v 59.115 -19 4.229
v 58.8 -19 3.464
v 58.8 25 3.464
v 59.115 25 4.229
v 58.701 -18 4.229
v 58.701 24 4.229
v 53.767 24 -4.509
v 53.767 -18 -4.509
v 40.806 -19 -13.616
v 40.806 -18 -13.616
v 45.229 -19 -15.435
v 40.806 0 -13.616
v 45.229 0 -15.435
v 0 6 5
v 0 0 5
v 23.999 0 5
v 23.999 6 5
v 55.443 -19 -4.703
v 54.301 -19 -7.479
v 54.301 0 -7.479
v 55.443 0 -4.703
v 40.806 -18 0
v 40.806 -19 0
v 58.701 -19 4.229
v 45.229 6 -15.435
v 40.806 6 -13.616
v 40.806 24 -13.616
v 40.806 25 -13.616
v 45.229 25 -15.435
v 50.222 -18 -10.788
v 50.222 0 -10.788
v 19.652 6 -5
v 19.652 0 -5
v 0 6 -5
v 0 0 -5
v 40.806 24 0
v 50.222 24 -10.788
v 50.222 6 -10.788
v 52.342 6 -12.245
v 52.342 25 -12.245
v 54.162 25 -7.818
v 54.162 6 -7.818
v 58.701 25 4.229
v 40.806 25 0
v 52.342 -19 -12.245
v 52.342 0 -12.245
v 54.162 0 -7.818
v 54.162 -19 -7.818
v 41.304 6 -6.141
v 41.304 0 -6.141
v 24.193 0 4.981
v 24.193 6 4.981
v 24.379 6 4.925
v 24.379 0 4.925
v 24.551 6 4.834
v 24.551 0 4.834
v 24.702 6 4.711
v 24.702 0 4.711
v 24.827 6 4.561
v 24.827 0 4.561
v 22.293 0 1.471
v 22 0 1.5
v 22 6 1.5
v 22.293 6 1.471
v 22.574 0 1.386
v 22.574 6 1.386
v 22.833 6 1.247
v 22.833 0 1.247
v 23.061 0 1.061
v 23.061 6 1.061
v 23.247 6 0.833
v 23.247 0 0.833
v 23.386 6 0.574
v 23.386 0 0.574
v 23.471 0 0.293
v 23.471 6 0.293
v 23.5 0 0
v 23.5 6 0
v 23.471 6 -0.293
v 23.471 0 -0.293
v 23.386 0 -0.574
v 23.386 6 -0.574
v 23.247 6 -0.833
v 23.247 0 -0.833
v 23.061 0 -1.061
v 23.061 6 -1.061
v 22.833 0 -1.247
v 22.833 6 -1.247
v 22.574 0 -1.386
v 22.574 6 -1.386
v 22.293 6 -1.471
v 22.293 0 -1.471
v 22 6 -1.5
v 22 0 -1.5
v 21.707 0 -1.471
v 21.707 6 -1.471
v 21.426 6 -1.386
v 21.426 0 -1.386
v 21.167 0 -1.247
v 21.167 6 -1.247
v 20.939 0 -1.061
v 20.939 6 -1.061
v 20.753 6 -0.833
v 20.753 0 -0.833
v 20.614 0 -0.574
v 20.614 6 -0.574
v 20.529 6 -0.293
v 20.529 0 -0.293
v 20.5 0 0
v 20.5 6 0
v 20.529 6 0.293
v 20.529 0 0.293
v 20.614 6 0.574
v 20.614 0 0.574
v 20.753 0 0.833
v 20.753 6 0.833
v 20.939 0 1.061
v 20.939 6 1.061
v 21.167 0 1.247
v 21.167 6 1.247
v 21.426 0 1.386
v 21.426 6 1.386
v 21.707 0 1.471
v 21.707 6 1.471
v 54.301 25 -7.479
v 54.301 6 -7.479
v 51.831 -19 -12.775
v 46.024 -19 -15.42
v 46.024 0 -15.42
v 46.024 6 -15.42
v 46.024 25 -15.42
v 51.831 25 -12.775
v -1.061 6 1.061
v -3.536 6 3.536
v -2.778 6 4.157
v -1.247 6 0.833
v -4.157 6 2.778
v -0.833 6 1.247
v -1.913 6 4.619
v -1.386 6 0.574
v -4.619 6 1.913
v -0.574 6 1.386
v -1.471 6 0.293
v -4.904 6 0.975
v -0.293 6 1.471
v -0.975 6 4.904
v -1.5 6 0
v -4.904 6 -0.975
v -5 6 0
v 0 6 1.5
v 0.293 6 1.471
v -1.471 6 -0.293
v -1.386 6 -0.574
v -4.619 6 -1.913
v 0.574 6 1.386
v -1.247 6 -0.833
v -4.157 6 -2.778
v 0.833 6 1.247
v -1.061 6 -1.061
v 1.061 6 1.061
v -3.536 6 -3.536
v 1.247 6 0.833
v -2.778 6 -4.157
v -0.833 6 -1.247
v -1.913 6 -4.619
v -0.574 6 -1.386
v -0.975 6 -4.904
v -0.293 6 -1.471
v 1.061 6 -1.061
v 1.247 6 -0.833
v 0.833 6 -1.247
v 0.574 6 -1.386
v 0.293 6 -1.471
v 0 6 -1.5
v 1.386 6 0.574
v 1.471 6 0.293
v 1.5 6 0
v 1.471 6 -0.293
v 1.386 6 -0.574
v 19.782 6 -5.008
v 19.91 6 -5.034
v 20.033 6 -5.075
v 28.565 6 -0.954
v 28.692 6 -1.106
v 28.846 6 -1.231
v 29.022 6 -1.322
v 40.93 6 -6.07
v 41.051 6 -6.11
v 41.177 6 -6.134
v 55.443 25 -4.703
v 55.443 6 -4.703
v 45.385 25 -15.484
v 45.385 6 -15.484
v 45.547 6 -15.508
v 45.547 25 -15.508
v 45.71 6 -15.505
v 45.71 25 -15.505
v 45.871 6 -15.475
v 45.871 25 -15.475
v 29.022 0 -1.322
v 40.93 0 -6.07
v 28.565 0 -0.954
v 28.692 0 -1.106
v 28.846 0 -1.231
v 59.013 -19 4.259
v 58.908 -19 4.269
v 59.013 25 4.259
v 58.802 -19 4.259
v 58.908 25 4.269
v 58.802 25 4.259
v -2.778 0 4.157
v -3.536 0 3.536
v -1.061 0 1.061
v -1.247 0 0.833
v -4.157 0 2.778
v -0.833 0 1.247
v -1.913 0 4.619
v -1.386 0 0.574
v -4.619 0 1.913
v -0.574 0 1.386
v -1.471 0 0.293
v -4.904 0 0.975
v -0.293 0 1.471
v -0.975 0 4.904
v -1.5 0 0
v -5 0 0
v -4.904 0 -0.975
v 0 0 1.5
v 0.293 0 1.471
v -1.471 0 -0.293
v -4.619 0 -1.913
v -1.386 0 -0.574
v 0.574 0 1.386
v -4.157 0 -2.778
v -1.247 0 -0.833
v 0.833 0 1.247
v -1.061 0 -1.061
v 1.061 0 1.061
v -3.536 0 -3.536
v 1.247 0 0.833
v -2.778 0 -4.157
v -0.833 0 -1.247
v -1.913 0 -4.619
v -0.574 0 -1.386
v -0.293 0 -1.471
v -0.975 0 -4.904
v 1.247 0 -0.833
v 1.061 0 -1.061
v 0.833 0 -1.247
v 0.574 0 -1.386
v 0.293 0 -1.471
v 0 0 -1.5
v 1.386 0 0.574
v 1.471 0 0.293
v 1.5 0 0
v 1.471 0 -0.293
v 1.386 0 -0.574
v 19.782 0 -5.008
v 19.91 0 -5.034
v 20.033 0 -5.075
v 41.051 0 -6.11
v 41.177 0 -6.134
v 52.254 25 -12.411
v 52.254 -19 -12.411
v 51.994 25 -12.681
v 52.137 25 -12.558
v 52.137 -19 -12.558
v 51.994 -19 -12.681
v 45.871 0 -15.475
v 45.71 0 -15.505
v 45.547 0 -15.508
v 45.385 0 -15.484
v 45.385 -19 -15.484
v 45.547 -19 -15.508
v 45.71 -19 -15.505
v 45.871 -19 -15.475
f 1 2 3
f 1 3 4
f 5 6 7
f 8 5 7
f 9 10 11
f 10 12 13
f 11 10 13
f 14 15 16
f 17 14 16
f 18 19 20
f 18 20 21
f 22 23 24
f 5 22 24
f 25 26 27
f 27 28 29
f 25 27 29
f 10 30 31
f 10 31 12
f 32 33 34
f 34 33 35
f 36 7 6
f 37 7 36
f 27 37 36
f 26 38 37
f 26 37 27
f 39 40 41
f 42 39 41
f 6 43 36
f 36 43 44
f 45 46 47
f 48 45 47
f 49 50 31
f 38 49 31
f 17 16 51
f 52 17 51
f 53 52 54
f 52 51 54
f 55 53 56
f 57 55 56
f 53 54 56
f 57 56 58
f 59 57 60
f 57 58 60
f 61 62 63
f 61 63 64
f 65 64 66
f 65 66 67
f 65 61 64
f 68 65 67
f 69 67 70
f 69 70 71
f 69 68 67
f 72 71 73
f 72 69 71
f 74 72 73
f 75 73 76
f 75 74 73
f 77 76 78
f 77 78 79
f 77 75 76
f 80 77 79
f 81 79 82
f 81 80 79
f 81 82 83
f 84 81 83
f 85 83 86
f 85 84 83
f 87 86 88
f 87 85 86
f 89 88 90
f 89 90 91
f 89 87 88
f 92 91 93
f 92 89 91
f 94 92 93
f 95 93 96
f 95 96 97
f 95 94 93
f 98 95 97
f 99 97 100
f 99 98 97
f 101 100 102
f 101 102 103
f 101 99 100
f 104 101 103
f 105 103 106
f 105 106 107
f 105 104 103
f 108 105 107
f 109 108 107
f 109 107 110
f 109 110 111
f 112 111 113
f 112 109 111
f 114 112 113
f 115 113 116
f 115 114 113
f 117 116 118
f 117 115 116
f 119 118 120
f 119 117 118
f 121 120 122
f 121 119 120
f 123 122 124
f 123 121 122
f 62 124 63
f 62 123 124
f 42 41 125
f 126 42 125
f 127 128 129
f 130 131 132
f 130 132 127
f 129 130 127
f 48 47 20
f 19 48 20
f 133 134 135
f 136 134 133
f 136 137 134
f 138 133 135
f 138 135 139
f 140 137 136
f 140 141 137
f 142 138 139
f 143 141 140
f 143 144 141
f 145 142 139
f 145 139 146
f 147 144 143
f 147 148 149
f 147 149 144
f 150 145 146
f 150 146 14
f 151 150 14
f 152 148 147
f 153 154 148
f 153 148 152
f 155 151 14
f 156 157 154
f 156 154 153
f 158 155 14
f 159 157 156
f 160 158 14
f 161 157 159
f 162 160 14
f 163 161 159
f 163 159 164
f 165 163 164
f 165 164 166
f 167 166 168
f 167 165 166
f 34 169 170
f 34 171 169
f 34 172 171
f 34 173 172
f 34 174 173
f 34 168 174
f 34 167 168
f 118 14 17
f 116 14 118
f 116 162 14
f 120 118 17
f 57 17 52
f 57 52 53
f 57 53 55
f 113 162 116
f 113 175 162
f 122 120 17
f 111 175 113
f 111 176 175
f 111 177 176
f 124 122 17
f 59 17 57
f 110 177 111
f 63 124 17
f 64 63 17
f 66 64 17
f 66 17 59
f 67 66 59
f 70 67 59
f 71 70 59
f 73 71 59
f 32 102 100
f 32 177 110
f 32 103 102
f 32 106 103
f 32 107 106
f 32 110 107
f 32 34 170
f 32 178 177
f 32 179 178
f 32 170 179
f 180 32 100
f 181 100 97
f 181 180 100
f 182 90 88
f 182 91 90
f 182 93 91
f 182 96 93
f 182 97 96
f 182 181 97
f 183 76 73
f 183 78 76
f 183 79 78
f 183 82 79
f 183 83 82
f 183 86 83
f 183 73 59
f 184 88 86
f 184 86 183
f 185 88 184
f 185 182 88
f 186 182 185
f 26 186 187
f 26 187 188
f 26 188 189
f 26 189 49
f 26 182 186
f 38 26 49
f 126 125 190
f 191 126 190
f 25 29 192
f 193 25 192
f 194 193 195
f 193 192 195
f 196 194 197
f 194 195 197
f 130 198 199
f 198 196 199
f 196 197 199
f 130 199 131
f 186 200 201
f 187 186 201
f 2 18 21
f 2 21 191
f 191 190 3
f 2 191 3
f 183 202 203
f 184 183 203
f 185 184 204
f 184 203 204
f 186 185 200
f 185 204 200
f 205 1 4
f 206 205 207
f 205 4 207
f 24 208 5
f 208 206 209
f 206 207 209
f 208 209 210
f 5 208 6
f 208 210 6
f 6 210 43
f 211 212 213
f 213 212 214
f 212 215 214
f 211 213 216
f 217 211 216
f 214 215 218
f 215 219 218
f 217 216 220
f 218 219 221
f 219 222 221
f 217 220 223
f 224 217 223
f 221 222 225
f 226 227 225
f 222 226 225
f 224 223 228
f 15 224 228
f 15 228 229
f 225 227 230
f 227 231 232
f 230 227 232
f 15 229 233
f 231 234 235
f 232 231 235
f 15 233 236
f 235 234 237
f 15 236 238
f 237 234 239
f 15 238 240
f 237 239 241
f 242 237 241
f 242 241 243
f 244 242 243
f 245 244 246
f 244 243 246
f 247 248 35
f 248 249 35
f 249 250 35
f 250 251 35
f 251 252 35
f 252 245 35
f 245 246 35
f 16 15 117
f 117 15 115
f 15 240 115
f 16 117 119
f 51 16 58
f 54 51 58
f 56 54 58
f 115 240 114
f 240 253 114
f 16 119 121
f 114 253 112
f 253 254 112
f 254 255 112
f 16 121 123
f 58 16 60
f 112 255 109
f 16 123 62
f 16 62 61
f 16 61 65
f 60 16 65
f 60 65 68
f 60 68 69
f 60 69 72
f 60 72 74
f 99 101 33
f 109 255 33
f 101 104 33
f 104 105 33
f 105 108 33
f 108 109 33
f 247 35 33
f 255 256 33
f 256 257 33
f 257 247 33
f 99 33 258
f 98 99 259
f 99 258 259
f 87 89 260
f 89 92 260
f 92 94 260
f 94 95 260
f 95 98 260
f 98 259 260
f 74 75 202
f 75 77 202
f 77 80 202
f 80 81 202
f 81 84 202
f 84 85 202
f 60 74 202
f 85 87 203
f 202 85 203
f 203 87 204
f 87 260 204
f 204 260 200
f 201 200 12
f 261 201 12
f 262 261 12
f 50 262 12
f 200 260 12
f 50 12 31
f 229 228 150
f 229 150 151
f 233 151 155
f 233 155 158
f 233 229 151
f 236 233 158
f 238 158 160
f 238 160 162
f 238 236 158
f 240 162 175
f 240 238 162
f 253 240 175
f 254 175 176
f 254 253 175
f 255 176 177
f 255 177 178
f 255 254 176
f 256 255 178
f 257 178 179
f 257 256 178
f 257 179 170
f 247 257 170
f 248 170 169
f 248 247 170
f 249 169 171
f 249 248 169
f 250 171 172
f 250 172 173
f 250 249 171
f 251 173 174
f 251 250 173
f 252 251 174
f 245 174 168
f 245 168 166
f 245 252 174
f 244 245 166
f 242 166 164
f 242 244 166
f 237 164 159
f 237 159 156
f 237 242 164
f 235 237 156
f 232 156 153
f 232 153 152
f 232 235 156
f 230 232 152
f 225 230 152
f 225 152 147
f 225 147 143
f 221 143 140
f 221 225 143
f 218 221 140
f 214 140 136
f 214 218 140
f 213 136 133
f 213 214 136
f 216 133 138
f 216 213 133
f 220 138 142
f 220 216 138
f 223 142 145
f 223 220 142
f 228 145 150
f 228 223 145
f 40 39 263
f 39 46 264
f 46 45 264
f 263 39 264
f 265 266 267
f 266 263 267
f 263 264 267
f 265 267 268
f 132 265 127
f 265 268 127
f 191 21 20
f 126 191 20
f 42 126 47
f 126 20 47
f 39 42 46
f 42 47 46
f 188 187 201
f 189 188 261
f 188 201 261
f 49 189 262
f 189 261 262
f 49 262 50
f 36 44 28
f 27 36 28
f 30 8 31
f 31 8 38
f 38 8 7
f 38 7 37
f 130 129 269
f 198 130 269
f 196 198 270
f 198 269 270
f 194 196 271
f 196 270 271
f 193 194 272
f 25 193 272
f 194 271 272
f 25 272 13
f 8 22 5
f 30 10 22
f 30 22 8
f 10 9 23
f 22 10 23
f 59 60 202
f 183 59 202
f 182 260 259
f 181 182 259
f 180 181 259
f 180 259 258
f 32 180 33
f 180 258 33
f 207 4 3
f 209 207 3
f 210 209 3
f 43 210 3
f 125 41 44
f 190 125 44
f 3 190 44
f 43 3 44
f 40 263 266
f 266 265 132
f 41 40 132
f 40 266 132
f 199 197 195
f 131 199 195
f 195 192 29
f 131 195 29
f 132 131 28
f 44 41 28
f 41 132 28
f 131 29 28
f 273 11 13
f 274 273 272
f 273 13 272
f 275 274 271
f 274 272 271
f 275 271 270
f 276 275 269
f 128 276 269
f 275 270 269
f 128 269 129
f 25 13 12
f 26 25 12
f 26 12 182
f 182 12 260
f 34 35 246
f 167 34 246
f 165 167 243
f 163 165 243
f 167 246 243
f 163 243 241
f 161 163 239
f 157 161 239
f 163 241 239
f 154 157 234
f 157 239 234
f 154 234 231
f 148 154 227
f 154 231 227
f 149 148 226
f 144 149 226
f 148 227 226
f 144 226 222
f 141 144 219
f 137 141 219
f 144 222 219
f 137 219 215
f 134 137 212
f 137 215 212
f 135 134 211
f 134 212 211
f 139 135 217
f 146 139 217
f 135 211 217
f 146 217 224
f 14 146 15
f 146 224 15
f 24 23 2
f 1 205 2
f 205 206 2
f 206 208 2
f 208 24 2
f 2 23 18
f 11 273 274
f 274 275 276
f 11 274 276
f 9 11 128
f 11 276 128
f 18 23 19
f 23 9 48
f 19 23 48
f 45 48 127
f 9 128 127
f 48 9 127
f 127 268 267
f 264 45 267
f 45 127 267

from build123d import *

# Parameters (mm, degrees)
SKETCH1_R                    = 1.5
BOSS_EXTRUDE1_DEPTH          = 6
SALIENTE_EXTRUIR7_DEPTH      = 19
SALIENTE_EXTRUIR7_DEPTH_BACK = 25
CORTAR_EXTRUIR2_DEPTH        = 25
SALIENTE_EXTRUIR8_DEPTH      = 1
SALIENTE_EXTRUIR10_DEPTH     = 1


with BuildPart() as part:
    # Sketch1 → Boss-Extrude1 (new body)
    with BuildSketch(Plane(origin=(0, 0, 0), x_dir=(1, 0, 0), z_dir=(0, 1, 0))):
        with BuildLine():
            Line((0, -5), (23.998875872, -5))
            ThreePointArc((23.998875872, -5), (24.467345461, -4.883479623), (24.826642543, -4.561072489))
            Line((24.826642543, -4.561072489), (28.564941326, 0.954149161))
            ThreePointArc((28.564941326, 0.954149161), (28.766036178, 1.172359953), (29.022312673, 1.321950886))
            Line((29.022312673, 1.321950886), (40.929553216, 6.070049343))
            ThreePointArc((40.929553216, 6.070049343), (41.304486381, 6.141164834), (41.678758689, 6.066649533))
            Line((41.678758689, 6.066649533), (47.144586244, 3.829406729))
            Line((47.144586244, 3.829406729), (48.06174016, 3.086958957))
            Line((48.06174016, 3.086958957), (48.804187932, 4.004112872))
            Line((48.804187932, 4.004112872), (49.721341848, 3.2616651))
            Line((49.721341848, 3.2616651), (50.46378962, 4.178819016))
            Line((50.46378962, 4.178819016), (51.380943536, 3.436371244))
            Line((51.380943536, 3.436371244), (52.123391308, 4.35352516))
            Line((52.123391308, 4.35352516), (53.040545224, 3.611077387))
            Line((53.040545224, 3.611077387), (53.782992996, 4.528231303))
            Line((53.782992996, 4.528231303), (54.700146912, 3.785783531))
            Line((54.700146912, 3.785783531), (55.442594685, 4.702937447))
            Line((55.442594685, 4.702937447), (52.341745918, 12.244834503))
            ThreePointArc((52.341745918, 12.244834503), (52.137055639, 12.558350103), (51.831402108, 12.774604725))
            Line((51.831402108, 12.774604725), (46.024183924, 15.419882568))
            ThreePointArc((46.024183924, 15.419882568), (45.628323444, 15.509674561), (45.229386093, 15.434727162))
            Line((45.229386093, 15.434727162), (20.032711481, 5.075121772))
            ThreePointArc((20.032711481, 5.075121772), (19.846254378, 5.018960187), (19.652448068, 5))
            Line((19.652448068, 5), (0, 5))
            ThreePointArc((0, 5), (-5, 0), (0, -5))
        make_face()
        with Locations(Location((0, 0, 0), (0, 0, 270))):
            Circle(SKETCH1_R, mode=Mode.SUBTRACT)
        with Locations(Location((22, 0, 0), (0, 0, 270))):
            Circle(SKETCH1_R, mode=Mode.SUBTRACT)
    extrude(amount=BOSS_EXTRUDE1_DEPTH)

    # Croquis4 → Saliente-Extruir7 (add, two sides: drawn at the far end of the back side and taken through both)
    with BuildSketch(Plane.XZ.offset(-SALIENTE_EXTRUIR7_DEPTH_BACK)):
        with BuildLine():
            Line((54.700146912, -3.785783531), (55.442594685, -4.702937447))
            Line((55.442594685, -4.702937447), (58.800233779, 3.463526096))
            Line((58.800233779, 3.463526096), (59.114761869, 4.228522601))
            ThreePointArc((59.114761869, 4.228522601), (58.907872463, 4.269394003), (58.700983057, 4.228522601))
            Line((58.700983057, 4.228522601), (53.767339251, -4.508894058))
            Line((53.767339251, -4.508894058), (53.782992996, -4.528231303))
            Line((53.782992996, -4.528231303), (54.700146912, -3.785783531))
        make_face()
        with BuildLine():
            Line((54.16164527, -7.818467854), (54.301219391, -7.478995106))
            Line((54.301219391, -7.478995106), (55.442594685, -4.702937447))
            Line((55.442594685, -4.702937447), (54.700146912, -3.785783531))
            Line((54.700146912, -3.785783531), (53.782992996, -4.528231303))
            Line((53.782992996, -4.528231303), (53.767339251, -4.508894058))
            Line((53.767339251, -4.508894058), (50.221708115, -10.788158993))
            Line((50.221708115, -10.788158993), (40.806466815, -13.616245196))
            Line((40.806466815, -13.616245196), (45.229386093, -15.434727162))
            ThreePointArc((45.229386093, -15.434727162), (45.628323444, -15.509674561), (46.024183924, -15.419882568))
            Line((46.024183924, -15.419882568), (51.831402108, -12.774604725))
            ThreePointArc((51.831402108, -12.774604725), (52.137055639, -12.558350103), (52.341745918, -12.244834503))
            Line((52.341745918, -12.244834503), (54.16164527, -7.818467854))
        make_face()
    extrude(amount=SALIENTE_EXTRUIR7_DEPTH + SALIENTE_EXTRUIR7_DEPTH_BACK)

    # Croquis5 → Cortar-Extruir2 (cut)
    with BuildSketch(Plane.XZ):
        Polygon((41.304486381, -6.141164834), (50.221708115, -10.788158993), (53.767339251, -4.508894058), (53.601046398, -4.303470665), (53.040545224, -3.611077387), (52.123391308, -4.35352516), (51.380943536, -3.436371244), (50.46378962, -4.178819016), (49.721341848, -3.2616651), (48.804187932, -4.004112872), (48.06174016, -3.086958957), (47.144586244, -3.829406729), align=None)
    extrude(amount=-CORTAR_EXTRUIR2_DEPTH, mode=Mode.SUBTRACT)

    # Croquis6 → Saliente-Extruir8 (add)
    with BuildSketch(Plane(origin=(0, -19, 0), x_dir=(-1, 0, 0), z_dir=(0, -1, 0))):
        Polygon((-40.806466815, 13.616245196), (-40.806466815, 0), (-58.700983057, -4.228522601), (-50.221708115, 10.788158993), align=None)
    extrude(amount=-SALIENTE_EXTRUIR8_DEPTH)

    # Croquis7 → Saliente-Extruir10 (add)
    with BuildSketch(Plane(origin=(0, 25, 0), x_dir=(1, 0, 0), z_dir=(0, 1, 0))):
        Polygon((40.806466815, 0), (40.806466815, 13.616245196), (50.221708115, 10.788158993), (58.700983057, -4.228522601), align=None)
    extrude(amount=-SALIENTE_EXTRUIR10_DEPTH)


solid = part.part
